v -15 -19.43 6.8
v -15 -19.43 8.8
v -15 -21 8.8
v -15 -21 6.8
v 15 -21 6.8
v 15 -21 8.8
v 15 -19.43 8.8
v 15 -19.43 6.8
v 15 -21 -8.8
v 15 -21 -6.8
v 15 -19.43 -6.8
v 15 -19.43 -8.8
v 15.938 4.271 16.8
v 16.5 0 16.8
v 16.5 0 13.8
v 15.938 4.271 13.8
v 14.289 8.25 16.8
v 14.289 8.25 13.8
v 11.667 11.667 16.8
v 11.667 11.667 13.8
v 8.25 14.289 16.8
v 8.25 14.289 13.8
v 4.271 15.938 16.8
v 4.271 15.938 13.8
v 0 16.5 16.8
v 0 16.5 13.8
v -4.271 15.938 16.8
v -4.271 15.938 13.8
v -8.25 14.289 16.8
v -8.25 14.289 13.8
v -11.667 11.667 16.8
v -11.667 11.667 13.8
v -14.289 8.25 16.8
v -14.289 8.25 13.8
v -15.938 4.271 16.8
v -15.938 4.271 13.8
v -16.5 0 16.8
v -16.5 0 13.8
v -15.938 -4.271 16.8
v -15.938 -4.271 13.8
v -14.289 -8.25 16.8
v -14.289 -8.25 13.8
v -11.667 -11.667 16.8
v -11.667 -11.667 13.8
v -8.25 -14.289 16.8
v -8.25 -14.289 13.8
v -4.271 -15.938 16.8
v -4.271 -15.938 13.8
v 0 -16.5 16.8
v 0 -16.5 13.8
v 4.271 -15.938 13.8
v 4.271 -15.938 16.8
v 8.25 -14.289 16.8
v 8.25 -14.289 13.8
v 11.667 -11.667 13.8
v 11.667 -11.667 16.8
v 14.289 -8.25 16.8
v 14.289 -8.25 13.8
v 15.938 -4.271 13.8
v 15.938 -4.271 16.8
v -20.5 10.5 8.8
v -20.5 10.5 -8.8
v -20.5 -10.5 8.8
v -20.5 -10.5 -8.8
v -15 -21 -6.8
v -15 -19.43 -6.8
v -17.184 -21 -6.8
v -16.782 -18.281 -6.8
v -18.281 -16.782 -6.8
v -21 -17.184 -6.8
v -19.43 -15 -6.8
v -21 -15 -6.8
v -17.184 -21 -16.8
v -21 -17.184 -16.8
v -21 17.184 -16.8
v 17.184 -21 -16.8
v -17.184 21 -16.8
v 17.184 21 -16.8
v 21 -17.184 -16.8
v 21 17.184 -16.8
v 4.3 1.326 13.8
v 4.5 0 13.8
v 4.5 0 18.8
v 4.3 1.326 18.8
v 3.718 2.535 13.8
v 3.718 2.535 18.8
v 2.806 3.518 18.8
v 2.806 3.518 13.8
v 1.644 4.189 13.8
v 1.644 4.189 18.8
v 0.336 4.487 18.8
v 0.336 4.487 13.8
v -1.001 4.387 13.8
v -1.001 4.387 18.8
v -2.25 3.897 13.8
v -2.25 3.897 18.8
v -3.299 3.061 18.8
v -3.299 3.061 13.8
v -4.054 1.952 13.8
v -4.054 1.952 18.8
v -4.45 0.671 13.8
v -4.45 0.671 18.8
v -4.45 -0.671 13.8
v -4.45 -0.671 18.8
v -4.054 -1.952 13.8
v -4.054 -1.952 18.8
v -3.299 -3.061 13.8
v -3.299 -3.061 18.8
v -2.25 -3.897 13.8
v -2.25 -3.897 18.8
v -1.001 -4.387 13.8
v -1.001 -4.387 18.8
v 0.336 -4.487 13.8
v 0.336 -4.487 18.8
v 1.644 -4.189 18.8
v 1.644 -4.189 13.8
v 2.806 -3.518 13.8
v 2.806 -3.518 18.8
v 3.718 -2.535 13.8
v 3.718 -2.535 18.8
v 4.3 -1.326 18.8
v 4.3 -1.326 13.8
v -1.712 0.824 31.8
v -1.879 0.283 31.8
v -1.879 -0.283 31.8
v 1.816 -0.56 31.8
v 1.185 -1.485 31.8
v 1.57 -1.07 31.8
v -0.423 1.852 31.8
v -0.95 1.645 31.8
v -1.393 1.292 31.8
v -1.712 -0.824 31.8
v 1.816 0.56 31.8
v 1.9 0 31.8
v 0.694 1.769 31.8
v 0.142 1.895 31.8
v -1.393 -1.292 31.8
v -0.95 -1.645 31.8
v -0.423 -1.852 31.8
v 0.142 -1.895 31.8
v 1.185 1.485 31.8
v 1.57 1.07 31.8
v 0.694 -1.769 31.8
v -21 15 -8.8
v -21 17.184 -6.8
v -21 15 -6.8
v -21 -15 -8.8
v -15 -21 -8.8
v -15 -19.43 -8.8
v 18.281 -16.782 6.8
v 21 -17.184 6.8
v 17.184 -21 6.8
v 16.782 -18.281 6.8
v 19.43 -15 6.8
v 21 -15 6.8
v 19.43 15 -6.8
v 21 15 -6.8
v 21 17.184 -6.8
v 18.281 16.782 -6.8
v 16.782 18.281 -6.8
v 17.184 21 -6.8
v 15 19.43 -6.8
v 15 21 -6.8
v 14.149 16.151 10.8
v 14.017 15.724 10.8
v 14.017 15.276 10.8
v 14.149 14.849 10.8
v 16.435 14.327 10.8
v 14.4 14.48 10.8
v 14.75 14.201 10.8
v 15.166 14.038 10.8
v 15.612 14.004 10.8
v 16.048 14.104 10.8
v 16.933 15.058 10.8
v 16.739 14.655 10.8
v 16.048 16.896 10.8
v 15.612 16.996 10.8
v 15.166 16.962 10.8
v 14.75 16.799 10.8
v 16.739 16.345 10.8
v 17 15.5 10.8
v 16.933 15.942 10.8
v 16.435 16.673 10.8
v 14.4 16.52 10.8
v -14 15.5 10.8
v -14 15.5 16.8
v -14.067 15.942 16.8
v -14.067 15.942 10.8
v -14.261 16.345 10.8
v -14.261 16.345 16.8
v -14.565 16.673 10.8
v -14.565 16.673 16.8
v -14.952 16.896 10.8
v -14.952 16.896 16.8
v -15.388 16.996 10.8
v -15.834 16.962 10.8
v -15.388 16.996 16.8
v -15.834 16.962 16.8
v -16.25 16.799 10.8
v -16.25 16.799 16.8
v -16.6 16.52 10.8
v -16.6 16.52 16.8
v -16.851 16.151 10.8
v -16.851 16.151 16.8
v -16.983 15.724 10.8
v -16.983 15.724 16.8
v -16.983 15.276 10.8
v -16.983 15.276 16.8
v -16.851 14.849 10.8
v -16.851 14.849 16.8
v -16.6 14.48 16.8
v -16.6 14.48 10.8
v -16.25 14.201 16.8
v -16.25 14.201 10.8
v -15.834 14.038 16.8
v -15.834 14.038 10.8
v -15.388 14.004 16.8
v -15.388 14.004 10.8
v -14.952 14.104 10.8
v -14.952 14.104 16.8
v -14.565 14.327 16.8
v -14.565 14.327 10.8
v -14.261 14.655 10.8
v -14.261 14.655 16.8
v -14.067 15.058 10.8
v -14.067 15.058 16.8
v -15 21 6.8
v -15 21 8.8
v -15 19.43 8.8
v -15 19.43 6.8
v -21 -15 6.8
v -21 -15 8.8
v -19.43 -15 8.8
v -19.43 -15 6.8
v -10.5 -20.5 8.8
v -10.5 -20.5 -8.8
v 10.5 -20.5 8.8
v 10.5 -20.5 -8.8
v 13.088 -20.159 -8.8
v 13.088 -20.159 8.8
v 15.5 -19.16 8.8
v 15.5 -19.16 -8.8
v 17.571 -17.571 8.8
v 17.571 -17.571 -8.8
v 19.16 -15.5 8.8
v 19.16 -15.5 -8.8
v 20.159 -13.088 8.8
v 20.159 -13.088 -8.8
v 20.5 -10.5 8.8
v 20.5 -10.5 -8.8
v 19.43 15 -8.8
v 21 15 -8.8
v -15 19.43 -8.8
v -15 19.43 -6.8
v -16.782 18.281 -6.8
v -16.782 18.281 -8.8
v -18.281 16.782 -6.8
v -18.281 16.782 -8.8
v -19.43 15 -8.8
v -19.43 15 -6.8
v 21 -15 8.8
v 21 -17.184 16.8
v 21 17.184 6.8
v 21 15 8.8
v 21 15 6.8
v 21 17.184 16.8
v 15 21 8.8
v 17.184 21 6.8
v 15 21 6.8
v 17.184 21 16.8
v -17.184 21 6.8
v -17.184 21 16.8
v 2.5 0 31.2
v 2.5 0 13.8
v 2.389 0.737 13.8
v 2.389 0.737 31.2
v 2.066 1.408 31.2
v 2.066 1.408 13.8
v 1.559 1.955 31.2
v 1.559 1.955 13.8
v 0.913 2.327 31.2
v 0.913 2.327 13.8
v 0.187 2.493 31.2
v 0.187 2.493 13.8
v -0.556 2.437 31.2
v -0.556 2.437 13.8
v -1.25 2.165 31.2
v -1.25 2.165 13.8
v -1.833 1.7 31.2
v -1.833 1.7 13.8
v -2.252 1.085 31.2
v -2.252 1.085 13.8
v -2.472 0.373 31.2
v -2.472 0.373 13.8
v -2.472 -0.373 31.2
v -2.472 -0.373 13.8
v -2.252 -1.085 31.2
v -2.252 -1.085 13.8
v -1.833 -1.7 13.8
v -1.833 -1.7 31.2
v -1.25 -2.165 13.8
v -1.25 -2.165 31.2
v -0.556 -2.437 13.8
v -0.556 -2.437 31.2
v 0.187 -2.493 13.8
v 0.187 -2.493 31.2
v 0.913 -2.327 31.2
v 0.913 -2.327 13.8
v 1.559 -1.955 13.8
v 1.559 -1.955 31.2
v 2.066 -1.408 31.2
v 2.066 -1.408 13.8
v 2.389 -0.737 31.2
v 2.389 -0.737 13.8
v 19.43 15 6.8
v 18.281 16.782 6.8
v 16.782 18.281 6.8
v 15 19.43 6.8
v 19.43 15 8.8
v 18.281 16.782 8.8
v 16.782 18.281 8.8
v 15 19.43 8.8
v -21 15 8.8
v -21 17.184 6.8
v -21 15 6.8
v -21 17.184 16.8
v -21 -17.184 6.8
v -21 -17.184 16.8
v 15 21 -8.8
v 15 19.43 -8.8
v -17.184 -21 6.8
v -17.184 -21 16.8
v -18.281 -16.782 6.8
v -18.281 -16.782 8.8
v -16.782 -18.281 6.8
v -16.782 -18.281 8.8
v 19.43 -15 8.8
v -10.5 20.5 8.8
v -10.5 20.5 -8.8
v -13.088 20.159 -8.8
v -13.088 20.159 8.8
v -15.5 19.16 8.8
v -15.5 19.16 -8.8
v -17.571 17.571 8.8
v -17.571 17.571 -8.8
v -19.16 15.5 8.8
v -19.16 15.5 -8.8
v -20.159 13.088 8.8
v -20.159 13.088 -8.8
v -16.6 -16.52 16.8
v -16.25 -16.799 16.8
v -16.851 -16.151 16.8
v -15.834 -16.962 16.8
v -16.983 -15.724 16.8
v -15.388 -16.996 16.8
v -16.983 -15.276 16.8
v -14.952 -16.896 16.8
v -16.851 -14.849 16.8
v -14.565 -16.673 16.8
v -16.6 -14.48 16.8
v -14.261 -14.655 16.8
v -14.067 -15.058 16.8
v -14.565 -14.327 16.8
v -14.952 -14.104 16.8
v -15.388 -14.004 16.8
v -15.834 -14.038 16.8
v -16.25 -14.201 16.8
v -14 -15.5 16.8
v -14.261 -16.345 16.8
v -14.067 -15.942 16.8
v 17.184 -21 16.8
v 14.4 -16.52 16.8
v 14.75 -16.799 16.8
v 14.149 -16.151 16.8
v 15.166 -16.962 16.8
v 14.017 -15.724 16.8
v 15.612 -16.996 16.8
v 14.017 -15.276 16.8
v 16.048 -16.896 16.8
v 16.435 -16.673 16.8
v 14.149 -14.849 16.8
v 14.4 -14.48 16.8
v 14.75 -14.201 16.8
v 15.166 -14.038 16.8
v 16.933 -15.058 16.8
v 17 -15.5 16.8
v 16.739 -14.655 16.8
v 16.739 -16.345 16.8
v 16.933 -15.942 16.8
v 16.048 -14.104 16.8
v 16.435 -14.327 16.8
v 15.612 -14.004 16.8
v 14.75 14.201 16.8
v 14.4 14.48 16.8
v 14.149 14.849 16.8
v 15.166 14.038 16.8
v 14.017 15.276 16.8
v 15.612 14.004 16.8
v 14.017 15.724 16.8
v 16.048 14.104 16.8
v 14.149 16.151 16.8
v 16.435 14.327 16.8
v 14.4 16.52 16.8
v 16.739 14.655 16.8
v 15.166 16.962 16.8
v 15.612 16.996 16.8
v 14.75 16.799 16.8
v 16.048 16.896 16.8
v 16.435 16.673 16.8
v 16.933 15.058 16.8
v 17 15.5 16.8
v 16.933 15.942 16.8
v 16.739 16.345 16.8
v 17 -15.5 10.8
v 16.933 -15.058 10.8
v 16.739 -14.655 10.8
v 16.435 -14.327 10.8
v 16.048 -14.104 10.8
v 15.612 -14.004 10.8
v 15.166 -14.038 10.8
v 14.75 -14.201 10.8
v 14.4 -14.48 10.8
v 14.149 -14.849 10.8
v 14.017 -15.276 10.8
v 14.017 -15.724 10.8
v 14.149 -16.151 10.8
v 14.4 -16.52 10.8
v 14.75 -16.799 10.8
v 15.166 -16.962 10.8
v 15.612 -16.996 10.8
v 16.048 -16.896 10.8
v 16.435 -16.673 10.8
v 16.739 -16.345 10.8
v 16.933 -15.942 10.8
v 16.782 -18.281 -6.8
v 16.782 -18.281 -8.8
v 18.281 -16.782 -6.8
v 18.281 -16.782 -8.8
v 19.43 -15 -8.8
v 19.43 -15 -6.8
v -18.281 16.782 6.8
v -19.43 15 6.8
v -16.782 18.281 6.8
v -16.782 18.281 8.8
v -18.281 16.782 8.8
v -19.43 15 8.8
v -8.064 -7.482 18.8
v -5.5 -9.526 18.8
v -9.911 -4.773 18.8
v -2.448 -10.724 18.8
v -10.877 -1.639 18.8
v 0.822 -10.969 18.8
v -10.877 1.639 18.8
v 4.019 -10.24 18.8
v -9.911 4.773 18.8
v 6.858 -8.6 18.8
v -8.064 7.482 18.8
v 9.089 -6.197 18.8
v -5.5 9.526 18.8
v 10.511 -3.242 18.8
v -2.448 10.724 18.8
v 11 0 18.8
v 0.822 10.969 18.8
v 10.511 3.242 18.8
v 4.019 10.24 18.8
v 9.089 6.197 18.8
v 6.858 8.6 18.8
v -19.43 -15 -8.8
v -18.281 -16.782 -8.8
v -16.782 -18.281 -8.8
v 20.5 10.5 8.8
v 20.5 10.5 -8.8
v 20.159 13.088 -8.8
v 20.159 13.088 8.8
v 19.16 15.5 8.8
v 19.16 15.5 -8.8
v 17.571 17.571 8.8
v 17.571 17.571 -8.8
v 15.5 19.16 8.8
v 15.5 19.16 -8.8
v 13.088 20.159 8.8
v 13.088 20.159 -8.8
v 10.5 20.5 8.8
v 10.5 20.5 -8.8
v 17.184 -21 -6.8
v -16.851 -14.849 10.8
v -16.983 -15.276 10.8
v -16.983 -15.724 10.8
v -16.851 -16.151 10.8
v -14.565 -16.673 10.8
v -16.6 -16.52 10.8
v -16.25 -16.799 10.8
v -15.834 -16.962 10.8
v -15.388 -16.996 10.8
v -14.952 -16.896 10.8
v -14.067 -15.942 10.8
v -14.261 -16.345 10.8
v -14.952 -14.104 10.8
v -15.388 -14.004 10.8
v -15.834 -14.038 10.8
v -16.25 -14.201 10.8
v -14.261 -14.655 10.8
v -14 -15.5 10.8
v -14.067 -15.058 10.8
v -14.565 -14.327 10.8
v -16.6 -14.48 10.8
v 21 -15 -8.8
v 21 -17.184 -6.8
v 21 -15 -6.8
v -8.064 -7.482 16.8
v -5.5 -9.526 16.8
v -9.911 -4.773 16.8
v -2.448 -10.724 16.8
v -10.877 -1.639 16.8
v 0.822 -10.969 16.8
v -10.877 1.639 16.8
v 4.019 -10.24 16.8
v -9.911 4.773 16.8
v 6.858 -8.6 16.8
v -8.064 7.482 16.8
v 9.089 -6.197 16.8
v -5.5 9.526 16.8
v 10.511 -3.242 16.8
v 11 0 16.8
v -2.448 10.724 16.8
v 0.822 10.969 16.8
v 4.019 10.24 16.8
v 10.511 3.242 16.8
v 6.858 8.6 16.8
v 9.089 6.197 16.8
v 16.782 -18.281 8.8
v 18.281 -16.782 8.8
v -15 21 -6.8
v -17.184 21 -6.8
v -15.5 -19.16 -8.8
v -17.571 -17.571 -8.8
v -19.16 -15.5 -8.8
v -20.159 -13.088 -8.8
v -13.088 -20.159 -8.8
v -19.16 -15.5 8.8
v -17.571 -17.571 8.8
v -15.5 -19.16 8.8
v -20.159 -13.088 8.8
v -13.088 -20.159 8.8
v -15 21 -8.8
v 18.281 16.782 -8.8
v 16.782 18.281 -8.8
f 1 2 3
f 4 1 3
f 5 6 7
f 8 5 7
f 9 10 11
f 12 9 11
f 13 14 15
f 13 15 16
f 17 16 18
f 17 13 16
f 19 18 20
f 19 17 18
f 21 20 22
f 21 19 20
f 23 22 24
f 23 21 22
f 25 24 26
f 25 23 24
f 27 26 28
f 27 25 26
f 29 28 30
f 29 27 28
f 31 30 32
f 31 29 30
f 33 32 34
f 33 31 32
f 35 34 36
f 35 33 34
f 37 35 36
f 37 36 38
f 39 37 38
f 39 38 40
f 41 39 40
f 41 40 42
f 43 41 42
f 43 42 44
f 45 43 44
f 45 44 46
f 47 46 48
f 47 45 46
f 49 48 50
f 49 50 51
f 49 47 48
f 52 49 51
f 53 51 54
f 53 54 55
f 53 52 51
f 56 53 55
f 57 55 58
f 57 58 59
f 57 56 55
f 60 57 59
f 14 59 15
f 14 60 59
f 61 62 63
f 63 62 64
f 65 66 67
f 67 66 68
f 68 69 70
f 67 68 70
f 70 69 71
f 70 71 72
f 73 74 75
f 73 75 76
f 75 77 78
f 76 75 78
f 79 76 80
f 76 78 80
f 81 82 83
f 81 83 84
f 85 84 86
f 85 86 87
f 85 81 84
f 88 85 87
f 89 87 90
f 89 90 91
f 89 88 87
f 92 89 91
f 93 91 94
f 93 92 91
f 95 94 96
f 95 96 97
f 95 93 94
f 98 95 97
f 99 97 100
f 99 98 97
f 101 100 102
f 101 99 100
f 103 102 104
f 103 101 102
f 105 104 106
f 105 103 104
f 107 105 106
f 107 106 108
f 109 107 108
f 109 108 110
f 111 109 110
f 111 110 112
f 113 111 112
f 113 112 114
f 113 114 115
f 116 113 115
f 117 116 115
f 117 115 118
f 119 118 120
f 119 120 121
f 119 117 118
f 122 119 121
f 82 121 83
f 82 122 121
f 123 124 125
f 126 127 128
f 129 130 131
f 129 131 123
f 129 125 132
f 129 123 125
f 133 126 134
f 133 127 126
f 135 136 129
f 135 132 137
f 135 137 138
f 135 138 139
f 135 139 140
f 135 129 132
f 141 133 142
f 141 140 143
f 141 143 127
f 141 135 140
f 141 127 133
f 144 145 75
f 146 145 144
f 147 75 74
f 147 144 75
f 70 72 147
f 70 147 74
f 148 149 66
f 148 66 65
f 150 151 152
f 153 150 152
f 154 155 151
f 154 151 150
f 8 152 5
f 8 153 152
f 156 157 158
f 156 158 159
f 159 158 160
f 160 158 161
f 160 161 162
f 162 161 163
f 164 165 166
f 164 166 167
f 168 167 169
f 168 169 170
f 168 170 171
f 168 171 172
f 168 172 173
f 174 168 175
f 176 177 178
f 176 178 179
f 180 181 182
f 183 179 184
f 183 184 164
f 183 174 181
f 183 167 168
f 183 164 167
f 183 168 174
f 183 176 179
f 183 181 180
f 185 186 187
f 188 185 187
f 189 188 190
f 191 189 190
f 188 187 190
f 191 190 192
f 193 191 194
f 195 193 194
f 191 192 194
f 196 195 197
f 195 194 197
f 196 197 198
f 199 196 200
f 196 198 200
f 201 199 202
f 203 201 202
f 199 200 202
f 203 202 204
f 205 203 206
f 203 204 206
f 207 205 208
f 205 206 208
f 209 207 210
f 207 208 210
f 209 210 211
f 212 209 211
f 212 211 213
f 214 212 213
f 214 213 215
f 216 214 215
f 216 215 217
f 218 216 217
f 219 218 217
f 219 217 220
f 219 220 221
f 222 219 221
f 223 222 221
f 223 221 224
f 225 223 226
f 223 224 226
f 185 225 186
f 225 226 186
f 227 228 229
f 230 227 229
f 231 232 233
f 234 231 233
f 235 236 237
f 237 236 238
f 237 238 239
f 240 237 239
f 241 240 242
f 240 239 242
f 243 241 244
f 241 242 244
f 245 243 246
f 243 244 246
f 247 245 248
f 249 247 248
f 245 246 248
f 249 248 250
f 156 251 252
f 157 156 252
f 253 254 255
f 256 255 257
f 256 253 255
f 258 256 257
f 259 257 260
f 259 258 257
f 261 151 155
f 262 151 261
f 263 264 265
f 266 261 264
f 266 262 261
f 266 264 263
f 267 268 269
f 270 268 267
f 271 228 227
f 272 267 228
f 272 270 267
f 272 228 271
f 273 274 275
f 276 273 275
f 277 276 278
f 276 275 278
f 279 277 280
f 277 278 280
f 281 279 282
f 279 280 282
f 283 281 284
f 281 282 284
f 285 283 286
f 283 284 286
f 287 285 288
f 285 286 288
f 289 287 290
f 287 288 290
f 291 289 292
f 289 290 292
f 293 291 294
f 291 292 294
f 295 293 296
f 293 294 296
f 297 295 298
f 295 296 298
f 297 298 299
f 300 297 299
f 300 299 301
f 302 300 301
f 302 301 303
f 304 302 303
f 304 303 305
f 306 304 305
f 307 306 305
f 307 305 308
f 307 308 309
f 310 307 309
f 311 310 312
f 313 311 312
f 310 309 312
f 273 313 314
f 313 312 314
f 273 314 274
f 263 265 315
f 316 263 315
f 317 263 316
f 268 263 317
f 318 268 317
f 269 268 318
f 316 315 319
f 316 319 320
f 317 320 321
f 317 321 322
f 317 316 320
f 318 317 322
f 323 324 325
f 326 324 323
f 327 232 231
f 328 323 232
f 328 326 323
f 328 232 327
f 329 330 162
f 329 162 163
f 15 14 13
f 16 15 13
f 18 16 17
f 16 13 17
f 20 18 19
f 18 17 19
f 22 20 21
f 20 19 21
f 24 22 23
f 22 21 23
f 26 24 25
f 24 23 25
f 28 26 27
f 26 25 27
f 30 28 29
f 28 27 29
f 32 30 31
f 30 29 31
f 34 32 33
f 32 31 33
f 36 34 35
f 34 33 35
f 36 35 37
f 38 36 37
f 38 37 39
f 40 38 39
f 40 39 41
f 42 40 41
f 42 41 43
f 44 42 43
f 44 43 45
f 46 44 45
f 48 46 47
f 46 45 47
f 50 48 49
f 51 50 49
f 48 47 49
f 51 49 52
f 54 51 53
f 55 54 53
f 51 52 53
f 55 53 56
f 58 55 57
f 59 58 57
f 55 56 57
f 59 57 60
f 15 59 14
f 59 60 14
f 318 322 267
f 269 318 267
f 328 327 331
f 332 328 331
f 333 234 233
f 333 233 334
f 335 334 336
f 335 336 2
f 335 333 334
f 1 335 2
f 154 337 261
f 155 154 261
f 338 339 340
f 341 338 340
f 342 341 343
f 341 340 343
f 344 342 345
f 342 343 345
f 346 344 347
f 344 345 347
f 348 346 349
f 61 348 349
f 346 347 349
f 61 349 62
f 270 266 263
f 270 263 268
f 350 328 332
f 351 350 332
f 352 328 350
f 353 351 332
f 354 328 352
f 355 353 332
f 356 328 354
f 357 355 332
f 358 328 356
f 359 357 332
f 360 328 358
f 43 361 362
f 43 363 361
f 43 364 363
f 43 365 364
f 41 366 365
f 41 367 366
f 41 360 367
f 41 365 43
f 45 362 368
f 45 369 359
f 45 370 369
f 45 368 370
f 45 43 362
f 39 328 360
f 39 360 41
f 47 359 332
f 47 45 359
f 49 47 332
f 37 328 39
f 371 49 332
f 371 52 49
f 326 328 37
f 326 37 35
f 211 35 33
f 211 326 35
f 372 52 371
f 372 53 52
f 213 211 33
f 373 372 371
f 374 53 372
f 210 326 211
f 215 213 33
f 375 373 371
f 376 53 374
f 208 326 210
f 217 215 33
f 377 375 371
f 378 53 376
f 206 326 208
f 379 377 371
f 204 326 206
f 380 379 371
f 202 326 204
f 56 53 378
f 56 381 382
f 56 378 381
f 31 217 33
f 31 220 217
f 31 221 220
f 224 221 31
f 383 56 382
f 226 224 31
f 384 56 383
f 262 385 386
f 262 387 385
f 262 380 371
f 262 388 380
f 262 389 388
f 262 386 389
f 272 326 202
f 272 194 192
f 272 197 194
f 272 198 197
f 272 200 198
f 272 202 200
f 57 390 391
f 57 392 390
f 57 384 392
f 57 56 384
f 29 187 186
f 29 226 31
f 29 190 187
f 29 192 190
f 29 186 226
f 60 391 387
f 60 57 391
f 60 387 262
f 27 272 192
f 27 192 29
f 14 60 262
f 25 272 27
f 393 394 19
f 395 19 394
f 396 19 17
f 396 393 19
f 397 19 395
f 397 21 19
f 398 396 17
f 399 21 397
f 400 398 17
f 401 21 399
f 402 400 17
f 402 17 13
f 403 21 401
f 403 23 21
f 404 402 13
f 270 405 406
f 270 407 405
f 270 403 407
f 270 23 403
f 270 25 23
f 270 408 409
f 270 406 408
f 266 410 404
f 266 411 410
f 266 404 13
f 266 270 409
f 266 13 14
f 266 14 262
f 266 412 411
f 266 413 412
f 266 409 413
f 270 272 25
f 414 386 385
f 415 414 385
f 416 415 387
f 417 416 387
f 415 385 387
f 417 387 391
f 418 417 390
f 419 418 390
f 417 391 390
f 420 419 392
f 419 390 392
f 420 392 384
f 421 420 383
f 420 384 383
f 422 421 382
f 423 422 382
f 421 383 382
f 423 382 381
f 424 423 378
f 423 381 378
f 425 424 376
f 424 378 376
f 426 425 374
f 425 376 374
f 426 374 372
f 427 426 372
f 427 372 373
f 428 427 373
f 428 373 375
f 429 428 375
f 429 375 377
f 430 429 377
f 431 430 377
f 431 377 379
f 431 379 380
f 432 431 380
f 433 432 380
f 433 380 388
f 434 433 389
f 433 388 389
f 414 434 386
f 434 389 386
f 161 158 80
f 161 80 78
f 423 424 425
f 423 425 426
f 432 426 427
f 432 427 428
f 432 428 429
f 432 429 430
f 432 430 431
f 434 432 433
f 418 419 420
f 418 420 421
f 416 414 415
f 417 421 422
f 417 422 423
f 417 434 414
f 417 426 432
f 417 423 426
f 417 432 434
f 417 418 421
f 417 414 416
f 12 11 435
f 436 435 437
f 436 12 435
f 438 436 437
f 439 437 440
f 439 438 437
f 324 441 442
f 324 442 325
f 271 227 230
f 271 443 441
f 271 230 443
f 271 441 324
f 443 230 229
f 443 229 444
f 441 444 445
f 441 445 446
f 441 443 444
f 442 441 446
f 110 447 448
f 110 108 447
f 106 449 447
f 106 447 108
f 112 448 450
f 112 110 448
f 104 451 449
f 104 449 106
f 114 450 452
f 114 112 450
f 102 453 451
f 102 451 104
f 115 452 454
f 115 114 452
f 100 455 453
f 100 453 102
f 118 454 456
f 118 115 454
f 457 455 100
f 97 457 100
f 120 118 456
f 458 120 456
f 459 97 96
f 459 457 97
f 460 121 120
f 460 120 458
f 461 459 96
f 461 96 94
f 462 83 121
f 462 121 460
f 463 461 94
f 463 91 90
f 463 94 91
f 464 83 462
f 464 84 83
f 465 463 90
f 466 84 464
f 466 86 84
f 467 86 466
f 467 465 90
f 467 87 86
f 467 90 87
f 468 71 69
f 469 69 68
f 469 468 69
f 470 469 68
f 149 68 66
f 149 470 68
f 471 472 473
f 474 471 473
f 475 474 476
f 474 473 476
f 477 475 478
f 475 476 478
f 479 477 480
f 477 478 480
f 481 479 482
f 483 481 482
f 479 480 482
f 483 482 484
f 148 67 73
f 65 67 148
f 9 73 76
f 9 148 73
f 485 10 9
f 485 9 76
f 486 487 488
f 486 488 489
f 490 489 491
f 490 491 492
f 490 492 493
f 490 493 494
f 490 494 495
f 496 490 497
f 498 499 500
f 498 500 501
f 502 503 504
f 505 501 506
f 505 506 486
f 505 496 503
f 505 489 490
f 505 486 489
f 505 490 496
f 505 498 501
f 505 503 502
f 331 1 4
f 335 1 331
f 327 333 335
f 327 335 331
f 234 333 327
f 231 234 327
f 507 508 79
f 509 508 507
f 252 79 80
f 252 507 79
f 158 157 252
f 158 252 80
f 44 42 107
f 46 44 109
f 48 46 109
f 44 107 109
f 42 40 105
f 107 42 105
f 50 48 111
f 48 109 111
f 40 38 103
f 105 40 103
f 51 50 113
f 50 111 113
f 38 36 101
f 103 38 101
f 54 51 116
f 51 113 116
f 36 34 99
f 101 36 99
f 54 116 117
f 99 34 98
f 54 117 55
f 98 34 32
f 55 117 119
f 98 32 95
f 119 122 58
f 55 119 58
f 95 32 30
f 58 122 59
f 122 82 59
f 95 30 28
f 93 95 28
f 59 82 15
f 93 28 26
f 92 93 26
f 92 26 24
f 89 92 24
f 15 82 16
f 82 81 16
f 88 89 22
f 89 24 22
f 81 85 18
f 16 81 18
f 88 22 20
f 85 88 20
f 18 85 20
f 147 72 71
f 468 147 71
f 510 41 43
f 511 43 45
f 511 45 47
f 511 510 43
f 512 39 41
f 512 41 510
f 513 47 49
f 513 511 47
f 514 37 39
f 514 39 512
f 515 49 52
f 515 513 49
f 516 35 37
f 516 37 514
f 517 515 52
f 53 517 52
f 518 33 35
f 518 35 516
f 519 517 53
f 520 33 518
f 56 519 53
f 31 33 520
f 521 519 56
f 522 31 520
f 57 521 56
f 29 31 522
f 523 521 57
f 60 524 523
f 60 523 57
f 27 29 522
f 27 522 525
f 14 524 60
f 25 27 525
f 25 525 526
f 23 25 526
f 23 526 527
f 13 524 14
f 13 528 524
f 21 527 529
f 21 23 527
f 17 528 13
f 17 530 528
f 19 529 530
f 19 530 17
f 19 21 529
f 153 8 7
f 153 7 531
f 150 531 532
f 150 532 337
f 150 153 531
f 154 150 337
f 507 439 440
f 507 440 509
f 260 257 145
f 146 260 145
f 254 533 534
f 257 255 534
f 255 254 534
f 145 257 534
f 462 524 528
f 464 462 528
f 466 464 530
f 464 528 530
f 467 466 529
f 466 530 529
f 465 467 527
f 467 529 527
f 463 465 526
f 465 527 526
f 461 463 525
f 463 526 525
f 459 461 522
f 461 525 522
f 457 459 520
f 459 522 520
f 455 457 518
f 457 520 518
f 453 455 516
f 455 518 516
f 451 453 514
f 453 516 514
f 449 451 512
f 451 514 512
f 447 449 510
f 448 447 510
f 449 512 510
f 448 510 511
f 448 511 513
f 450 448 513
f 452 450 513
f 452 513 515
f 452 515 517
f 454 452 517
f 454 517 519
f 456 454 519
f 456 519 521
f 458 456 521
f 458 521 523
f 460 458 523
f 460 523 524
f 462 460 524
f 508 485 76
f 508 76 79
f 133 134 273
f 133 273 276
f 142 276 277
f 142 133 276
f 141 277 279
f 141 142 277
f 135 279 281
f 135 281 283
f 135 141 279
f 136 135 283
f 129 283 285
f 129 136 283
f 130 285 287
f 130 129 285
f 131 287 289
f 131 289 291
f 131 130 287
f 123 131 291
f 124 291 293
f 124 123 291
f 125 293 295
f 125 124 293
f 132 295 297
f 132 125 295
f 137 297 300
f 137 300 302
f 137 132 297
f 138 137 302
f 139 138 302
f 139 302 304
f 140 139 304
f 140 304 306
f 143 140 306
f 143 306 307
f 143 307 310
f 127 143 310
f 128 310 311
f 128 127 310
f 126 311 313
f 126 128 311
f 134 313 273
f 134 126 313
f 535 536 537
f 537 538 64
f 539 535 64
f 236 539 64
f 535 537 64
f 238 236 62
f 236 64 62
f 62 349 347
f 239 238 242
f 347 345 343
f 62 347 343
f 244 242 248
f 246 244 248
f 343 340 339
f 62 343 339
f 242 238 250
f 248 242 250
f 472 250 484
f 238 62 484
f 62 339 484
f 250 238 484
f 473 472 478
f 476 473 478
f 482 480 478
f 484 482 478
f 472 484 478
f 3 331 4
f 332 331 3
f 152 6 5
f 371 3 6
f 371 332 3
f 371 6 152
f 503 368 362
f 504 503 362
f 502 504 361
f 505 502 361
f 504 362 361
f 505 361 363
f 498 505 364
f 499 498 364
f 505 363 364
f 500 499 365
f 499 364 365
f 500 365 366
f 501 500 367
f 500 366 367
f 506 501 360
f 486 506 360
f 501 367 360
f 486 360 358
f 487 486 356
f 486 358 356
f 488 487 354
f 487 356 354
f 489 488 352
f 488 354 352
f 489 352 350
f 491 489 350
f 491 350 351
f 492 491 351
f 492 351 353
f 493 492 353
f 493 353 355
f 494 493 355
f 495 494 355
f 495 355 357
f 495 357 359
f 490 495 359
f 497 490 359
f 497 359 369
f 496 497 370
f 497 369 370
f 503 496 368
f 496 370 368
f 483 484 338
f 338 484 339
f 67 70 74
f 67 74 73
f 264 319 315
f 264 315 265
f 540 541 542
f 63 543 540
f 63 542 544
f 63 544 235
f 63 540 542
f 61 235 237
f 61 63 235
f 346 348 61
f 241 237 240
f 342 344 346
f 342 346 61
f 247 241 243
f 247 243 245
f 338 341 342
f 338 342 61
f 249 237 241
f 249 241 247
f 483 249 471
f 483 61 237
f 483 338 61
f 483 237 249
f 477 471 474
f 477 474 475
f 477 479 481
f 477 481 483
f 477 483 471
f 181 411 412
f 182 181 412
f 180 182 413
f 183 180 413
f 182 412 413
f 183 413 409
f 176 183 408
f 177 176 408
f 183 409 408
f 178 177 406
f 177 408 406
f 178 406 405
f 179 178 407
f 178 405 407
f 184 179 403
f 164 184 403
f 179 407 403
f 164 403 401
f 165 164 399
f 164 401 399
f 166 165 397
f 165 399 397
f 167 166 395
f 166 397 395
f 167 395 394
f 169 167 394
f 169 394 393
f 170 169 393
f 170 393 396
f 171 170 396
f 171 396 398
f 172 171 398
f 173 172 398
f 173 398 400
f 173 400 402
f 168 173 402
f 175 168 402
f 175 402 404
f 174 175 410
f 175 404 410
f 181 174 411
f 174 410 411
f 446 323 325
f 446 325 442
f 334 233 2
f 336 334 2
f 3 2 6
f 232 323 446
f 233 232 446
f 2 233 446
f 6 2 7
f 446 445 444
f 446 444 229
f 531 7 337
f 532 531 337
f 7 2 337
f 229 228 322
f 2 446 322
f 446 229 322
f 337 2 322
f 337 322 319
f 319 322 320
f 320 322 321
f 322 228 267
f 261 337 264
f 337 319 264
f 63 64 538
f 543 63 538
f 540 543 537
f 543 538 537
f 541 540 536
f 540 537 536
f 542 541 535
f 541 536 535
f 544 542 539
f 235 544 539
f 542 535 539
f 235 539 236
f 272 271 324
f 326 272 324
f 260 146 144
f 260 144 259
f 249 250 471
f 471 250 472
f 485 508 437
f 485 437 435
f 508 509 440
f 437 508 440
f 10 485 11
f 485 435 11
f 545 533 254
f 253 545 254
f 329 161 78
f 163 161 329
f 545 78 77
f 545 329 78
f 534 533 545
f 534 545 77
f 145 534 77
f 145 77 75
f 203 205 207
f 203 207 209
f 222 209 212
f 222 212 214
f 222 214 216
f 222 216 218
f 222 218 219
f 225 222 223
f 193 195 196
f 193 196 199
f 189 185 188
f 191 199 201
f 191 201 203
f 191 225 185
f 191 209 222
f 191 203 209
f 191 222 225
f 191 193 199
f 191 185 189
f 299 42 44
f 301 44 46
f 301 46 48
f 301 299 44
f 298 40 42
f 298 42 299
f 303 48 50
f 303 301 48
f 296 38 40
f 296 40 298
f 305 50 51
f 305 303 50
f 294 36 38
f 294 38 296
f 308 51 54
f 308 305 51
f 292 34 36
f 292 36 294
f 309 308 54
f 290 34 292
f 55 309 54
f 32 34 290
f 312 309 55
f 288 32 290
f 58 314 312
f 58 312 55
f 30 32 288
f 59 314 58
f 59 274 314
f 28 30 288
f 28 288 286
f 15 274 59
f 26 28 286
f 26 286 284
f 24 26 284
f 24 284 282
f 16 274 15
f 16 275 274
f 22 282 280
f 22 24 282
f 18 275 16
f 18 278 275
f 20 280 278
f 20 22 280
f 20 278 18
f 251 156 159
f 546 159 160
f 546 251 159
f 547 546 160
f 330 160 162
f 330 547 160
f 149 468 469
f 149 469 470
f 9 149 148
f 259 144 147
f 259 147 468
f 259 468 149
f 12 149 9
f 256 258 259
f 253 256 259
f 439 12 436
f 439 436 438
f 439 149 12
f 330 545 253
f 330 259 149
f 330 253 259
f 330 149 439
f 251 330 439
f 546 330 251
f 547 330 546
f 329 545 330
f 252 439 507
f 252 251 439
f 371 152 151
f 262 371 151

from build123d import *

# Parameters (mm, degrees)
SALIENTE_EXTRUIR1_DEPTH = 16.8
CORTAR_EXTRUIR1_START   = -8
CROQUIS2_W              = 30
CROQUIS2_H              = 6
CROQUIS2_H_2            = 30
CROQUIS2_W_2            = 6
CORTAR_EXTRUIR1_DEPTH   = 17.6
CORTAR_EXTRUIR2_START   = -10
CORTAR_EXTRUIR2_DEPTH   = 13.6
CORTAR_EXTRUIR3_START   = -25.6
CORTAR_EXTRUIR3_DEPTH   = 17.6
SALIENTE_EXTRUIR2_START = -25.6
SALIENTE_EXTRUIR2_DEPTH = 17.6
CROQUIS5_R              = 16.5
CROQUIS5_R_2            = 11
CROQUIS5_R_3            = 4.5
CROQUIS5_R_4            = 2.5
CORTAR_EXTRUIR4_DEPTH   = 3
CROQUIS5_3_R            = 16.5
CROQUIS5_3_R_2          = 11
SALIENTE_EXTRUIR3_DEPTH = 3
SALIENTE_EXTRUIR4_START = -3
CROQUIS5_4_R            = 11
CROQUIS5_4_R_2          = 4.5
SALIENTE_EXTRUIR4_DEPTH = 5
SALIENTE_EXTRUIR5_START = -3
CROQUIS5_5_R            = 2.5
SALIENTE_EXTRUIR5_DEPTH = 18
CHAFL_N1_SIZE           = 0.6
CROQUIS6_R              = 1.5
CORTAR_EXTRUIR5_DEPTH   = 6


with BuildPart() as part:
    # Croquis1 → Saliente-Extruir1 (new, symmetric)
    with BuildSketch(Plane.XY):
        Polygon((-17.183766184, 21), (-21, 17.183766184), (-21, -17.183766184), (-17.183766184, -21), (17.183766184, -21), (21, -17.183766184), (21, 17.183766184), (17.183766184, 21), align=None)
    extrude(amount=SALIENTE_EXTRUIR1_DEPTH, both=True)

    # Croquis2 → Cortar-Extruir1 (cut)
    with BuildSketch(Plane.XY.offset(16.8).offset(CORTAR_EXTRUIR1_START)):
        with Locations((0, 18)):
            Rectangle(CROQUIS2_W, CROQUIS2_H)
        Rectangle(CROQUIS2_W, CROQUIS2_H_2)
        with Locations((18, 0)):
            Rectangle(CROQUIS2_W_2, CROQUIS2_H_2)
        with Locations((0, -18)):
            Rectangle(CROQUIS2_W, CROQUIS2_H)
        with Locations((-18, 0)):
            Rectangle(CROQUIS2_W_2, CROQUIS2_H_2)
    extrude(amount=-CORTAR_EXTRUIR1_DEPTH, mode=Mode.SUBTRACT)

    # Croquis3 → Cortar-Extruir2 (cut)
    with BuildSketch(Plane(origin=(0, 0, -16.8), x_dir=(-1, 0, 0), z_dir=(0, 0, -1)).offset(CORTAR_EXTRUIR2_START)):
        Polygon((-17.183766184, 21), (-21, 17.183766184), (-21, -17.183766184), (-17.183766184, -21), (17.183766184, -21), (21, -17.183766184), (21, 17.183766184), (17.183766184, 21), align=None)
    extrude(amount=-CORTAR_EXTRUIR2_DEPTH, mode=Mode.SUBTRACT)


with BuildPart() as cortar_extruir2_piece_1:
    # of the separate pieces the step leaves, piece 1, a body of its own (cortar_extruir2_pieces)
    add(part.part.solids().sort_by_distance((-17.183766184, 21, 16.8))[0])


with BuildPart() as cortar_extruir2_piece_2:
    # of the separate pieces the step leaves, piece 2, a body of its own (cortar_extruir2_pieces)
    add(part.part.solids().sort_by_distance((-17.183766184, 21, -6.8))[0])


with BuildPart() as cortar_extruir3_tool:
    # Croquis4<4> → Cortar-Extruir3 (new body)
    with BuildSketch(Plane.XY.offset(16.8).offset(CORTAR_EXTRUIR3_START)):
        with BuildLine():
            Line((-20.5, 10.5), (-20.5, -10.5))
            ThreePointArc((-20.5, -10.5), (-17.571067812, -17.571067812), (-10.5, -20.5))
            Line((-10.5, -20.5), (10.5, -20.5))
            ThreePointArc((10.5, -20.5), (17.571067812, -17.571067812), (20.5, -10.5))
            Line((20.5, -10.5), (20.5, 10.5))
            ThreePointArc((20.5, 10.5), (17.571067812, 17.571067812), (10.5, 20.5))
            Line((10.5, 20.5), (-10.5, 20.5))
            ThreePointArc((-10.5, 20.5), (-17.571067812, 17.571067812), (-20.5, 10.5))
        make_face()
    extrude(amount=CORTAR_EXTRUIR3_DEPTH)


with BuildPart() as cortar_extruir2_piece_1_1:
    add(cortar_extruir2_piece_1.part)

    # Cortar-Extruir3: cut by cortar_extruir3_tool
    add(cortar_extruir3_tool.part, mode=Mode.SUBTRACT)

    # Croquis5 → Cortar-Extruir4 (cut)
    # profile 1 of 4: a face of its own
    with BuildSketch(Plane.XY.offset(16.8)):
        Circle(CROQUIS5_R)
        Circle(CROQUIS5_R_2, mode=Mode.SUBTRACT)
    # profile 2 of 4: a face of its own
    with BuildSketch(Plane.XY.offset(16.8)):
        Circle(CROQUIS5_R_2)
        Circle(CROQUIS5_R_3, mode=Mode.SUBTRACT)
    # profile 3 of 4: a face of its own
    with BuildSketch(Plane.XY.offset(16.8)):
        Circle(CROQUIS5_R_3)
        Circle(CROQUIS5_R_4, mode=Mode.SUBTRACT)
    # profile 4 of 4: a face of its own
    with BuildSketch(Plane.XY.offset(16.8)):
        Circle(CROQUIS5_R_4)
    extrude(amount=-CORTAR_EXTRUIR4_DEPTH, mode=Mode.SUBTRACT)

    # Croquis5<5> → Saliente-Extruir5 (add)
    with BuildSketch(Plane.XY.offset(16.8).offset(SALIENTE_EXTRUIR5_START)):
        Circle(CROQUIS5_5_R)
    extrude(amount=SALIENTE_EXTRUIR5_DEPTH)

    # Chaflán1
    chafl_n1_edges = [cortar_extruir2_piece_1_1.edges().sort_by_distance(p)[0] for p in [
        (-2.5, 0, 31.8),
    ]]
    chamfer(chafl_n1_edges, length=CHAFL_N1_SIZE)

    # Croquis6 → Cortar-Extruir5 (cut)
    with BuildSketch(Plane.XY.offset(16.8)):
        with Locations((-15.5, -15.5)):
            Circle(CROQUIS6_R)
        with Locations((15.5, -15.5)):
            Circle(CROQUIS6_R)
        with Locations((15.5, 15.5)):
            Circle(CROQUIS6_R)
        with Locations((-15.5, 15.5)):
            Circle(CROQUIS6_R)
    extrude(amount=-CORTAR_EXTRUIR5_DEPTH, mode=Mode.SUBTRACT)


with BuildPart() as cortar_extruir2_piece_2_1:
    add(cortar_extruir2_piece_2.part)

    # Cortar-Extruir3: cut by cortar_extruir3_tool
    add(cortar_extruir3_tool.part, mode=Mode.SUBTRACT)


with BuildPart() as body_3:
    # Croquis4 → Saliente-Extruir2 (new body)
    with BuildSketch(Plane.XY.offset(16.8).offset(SALIENTE_EXTRUIR2_START)):
        with BuildLine():
            Line((-20.5, 10.5), (-20.5, -10.5))
            ThreePointArc((-20.5, -10.5), (-17.571067812, -17.571067812), (-10.5, -20.5))
            Line((-10.5, -20.5), (10.5, -20.5))
            ThreePointArc((10.5, -20.5), (17.571067812, -17.571067812), (20.5, -10.5))
            Line((20.5, -10.5), (20.5, 10.5))
            ThreePointArc((20.5, 10.5), (17.571067812, 17.571067812), (10.5, 20.5))
            Line((10.5, 20.5), (-10.5, 20.5))
            ThreePointArc((-10.5, 20.5), (-17.571067812, 17.571067812), (-20.5, 10.5))
        make_face()
    extrude(amount=SALIENTE_EXTRUIR2_DEPTH)


with BuildPart() as body_4:
    # Croquis5<3> → Saliente-Extruir3 (new body)
    with BuildSketch(Plane.XY.offset(16.8)):
        Circle(CROQUIS5_3_R)
        Circle(CROQUIS5_3_R_2, mode=Mode.SUBTRACT)
    extrude(amount=-SALIENTE_EXTRUIR3_DEPTH)

    # Croquis5<4> → Saliente-Extruir4 (add)
    with BuildSketch(Plane.XY.offset(16.8).offset(SALIENTE_EXTRUIR4_START)):
        Circle(CROQUIS5_4_R)
        Circle(CROQUIS5_4_R_2, mode=Mode.SUBTRACT)
    extrude(amount=SALIENTE_EXTRUIR4_DEPTH)


solid = Compound([cortar_extruir2_piece_1_1.part, cortar_extruir2_piece_2_1.part, body_3.part, body_4.part])
